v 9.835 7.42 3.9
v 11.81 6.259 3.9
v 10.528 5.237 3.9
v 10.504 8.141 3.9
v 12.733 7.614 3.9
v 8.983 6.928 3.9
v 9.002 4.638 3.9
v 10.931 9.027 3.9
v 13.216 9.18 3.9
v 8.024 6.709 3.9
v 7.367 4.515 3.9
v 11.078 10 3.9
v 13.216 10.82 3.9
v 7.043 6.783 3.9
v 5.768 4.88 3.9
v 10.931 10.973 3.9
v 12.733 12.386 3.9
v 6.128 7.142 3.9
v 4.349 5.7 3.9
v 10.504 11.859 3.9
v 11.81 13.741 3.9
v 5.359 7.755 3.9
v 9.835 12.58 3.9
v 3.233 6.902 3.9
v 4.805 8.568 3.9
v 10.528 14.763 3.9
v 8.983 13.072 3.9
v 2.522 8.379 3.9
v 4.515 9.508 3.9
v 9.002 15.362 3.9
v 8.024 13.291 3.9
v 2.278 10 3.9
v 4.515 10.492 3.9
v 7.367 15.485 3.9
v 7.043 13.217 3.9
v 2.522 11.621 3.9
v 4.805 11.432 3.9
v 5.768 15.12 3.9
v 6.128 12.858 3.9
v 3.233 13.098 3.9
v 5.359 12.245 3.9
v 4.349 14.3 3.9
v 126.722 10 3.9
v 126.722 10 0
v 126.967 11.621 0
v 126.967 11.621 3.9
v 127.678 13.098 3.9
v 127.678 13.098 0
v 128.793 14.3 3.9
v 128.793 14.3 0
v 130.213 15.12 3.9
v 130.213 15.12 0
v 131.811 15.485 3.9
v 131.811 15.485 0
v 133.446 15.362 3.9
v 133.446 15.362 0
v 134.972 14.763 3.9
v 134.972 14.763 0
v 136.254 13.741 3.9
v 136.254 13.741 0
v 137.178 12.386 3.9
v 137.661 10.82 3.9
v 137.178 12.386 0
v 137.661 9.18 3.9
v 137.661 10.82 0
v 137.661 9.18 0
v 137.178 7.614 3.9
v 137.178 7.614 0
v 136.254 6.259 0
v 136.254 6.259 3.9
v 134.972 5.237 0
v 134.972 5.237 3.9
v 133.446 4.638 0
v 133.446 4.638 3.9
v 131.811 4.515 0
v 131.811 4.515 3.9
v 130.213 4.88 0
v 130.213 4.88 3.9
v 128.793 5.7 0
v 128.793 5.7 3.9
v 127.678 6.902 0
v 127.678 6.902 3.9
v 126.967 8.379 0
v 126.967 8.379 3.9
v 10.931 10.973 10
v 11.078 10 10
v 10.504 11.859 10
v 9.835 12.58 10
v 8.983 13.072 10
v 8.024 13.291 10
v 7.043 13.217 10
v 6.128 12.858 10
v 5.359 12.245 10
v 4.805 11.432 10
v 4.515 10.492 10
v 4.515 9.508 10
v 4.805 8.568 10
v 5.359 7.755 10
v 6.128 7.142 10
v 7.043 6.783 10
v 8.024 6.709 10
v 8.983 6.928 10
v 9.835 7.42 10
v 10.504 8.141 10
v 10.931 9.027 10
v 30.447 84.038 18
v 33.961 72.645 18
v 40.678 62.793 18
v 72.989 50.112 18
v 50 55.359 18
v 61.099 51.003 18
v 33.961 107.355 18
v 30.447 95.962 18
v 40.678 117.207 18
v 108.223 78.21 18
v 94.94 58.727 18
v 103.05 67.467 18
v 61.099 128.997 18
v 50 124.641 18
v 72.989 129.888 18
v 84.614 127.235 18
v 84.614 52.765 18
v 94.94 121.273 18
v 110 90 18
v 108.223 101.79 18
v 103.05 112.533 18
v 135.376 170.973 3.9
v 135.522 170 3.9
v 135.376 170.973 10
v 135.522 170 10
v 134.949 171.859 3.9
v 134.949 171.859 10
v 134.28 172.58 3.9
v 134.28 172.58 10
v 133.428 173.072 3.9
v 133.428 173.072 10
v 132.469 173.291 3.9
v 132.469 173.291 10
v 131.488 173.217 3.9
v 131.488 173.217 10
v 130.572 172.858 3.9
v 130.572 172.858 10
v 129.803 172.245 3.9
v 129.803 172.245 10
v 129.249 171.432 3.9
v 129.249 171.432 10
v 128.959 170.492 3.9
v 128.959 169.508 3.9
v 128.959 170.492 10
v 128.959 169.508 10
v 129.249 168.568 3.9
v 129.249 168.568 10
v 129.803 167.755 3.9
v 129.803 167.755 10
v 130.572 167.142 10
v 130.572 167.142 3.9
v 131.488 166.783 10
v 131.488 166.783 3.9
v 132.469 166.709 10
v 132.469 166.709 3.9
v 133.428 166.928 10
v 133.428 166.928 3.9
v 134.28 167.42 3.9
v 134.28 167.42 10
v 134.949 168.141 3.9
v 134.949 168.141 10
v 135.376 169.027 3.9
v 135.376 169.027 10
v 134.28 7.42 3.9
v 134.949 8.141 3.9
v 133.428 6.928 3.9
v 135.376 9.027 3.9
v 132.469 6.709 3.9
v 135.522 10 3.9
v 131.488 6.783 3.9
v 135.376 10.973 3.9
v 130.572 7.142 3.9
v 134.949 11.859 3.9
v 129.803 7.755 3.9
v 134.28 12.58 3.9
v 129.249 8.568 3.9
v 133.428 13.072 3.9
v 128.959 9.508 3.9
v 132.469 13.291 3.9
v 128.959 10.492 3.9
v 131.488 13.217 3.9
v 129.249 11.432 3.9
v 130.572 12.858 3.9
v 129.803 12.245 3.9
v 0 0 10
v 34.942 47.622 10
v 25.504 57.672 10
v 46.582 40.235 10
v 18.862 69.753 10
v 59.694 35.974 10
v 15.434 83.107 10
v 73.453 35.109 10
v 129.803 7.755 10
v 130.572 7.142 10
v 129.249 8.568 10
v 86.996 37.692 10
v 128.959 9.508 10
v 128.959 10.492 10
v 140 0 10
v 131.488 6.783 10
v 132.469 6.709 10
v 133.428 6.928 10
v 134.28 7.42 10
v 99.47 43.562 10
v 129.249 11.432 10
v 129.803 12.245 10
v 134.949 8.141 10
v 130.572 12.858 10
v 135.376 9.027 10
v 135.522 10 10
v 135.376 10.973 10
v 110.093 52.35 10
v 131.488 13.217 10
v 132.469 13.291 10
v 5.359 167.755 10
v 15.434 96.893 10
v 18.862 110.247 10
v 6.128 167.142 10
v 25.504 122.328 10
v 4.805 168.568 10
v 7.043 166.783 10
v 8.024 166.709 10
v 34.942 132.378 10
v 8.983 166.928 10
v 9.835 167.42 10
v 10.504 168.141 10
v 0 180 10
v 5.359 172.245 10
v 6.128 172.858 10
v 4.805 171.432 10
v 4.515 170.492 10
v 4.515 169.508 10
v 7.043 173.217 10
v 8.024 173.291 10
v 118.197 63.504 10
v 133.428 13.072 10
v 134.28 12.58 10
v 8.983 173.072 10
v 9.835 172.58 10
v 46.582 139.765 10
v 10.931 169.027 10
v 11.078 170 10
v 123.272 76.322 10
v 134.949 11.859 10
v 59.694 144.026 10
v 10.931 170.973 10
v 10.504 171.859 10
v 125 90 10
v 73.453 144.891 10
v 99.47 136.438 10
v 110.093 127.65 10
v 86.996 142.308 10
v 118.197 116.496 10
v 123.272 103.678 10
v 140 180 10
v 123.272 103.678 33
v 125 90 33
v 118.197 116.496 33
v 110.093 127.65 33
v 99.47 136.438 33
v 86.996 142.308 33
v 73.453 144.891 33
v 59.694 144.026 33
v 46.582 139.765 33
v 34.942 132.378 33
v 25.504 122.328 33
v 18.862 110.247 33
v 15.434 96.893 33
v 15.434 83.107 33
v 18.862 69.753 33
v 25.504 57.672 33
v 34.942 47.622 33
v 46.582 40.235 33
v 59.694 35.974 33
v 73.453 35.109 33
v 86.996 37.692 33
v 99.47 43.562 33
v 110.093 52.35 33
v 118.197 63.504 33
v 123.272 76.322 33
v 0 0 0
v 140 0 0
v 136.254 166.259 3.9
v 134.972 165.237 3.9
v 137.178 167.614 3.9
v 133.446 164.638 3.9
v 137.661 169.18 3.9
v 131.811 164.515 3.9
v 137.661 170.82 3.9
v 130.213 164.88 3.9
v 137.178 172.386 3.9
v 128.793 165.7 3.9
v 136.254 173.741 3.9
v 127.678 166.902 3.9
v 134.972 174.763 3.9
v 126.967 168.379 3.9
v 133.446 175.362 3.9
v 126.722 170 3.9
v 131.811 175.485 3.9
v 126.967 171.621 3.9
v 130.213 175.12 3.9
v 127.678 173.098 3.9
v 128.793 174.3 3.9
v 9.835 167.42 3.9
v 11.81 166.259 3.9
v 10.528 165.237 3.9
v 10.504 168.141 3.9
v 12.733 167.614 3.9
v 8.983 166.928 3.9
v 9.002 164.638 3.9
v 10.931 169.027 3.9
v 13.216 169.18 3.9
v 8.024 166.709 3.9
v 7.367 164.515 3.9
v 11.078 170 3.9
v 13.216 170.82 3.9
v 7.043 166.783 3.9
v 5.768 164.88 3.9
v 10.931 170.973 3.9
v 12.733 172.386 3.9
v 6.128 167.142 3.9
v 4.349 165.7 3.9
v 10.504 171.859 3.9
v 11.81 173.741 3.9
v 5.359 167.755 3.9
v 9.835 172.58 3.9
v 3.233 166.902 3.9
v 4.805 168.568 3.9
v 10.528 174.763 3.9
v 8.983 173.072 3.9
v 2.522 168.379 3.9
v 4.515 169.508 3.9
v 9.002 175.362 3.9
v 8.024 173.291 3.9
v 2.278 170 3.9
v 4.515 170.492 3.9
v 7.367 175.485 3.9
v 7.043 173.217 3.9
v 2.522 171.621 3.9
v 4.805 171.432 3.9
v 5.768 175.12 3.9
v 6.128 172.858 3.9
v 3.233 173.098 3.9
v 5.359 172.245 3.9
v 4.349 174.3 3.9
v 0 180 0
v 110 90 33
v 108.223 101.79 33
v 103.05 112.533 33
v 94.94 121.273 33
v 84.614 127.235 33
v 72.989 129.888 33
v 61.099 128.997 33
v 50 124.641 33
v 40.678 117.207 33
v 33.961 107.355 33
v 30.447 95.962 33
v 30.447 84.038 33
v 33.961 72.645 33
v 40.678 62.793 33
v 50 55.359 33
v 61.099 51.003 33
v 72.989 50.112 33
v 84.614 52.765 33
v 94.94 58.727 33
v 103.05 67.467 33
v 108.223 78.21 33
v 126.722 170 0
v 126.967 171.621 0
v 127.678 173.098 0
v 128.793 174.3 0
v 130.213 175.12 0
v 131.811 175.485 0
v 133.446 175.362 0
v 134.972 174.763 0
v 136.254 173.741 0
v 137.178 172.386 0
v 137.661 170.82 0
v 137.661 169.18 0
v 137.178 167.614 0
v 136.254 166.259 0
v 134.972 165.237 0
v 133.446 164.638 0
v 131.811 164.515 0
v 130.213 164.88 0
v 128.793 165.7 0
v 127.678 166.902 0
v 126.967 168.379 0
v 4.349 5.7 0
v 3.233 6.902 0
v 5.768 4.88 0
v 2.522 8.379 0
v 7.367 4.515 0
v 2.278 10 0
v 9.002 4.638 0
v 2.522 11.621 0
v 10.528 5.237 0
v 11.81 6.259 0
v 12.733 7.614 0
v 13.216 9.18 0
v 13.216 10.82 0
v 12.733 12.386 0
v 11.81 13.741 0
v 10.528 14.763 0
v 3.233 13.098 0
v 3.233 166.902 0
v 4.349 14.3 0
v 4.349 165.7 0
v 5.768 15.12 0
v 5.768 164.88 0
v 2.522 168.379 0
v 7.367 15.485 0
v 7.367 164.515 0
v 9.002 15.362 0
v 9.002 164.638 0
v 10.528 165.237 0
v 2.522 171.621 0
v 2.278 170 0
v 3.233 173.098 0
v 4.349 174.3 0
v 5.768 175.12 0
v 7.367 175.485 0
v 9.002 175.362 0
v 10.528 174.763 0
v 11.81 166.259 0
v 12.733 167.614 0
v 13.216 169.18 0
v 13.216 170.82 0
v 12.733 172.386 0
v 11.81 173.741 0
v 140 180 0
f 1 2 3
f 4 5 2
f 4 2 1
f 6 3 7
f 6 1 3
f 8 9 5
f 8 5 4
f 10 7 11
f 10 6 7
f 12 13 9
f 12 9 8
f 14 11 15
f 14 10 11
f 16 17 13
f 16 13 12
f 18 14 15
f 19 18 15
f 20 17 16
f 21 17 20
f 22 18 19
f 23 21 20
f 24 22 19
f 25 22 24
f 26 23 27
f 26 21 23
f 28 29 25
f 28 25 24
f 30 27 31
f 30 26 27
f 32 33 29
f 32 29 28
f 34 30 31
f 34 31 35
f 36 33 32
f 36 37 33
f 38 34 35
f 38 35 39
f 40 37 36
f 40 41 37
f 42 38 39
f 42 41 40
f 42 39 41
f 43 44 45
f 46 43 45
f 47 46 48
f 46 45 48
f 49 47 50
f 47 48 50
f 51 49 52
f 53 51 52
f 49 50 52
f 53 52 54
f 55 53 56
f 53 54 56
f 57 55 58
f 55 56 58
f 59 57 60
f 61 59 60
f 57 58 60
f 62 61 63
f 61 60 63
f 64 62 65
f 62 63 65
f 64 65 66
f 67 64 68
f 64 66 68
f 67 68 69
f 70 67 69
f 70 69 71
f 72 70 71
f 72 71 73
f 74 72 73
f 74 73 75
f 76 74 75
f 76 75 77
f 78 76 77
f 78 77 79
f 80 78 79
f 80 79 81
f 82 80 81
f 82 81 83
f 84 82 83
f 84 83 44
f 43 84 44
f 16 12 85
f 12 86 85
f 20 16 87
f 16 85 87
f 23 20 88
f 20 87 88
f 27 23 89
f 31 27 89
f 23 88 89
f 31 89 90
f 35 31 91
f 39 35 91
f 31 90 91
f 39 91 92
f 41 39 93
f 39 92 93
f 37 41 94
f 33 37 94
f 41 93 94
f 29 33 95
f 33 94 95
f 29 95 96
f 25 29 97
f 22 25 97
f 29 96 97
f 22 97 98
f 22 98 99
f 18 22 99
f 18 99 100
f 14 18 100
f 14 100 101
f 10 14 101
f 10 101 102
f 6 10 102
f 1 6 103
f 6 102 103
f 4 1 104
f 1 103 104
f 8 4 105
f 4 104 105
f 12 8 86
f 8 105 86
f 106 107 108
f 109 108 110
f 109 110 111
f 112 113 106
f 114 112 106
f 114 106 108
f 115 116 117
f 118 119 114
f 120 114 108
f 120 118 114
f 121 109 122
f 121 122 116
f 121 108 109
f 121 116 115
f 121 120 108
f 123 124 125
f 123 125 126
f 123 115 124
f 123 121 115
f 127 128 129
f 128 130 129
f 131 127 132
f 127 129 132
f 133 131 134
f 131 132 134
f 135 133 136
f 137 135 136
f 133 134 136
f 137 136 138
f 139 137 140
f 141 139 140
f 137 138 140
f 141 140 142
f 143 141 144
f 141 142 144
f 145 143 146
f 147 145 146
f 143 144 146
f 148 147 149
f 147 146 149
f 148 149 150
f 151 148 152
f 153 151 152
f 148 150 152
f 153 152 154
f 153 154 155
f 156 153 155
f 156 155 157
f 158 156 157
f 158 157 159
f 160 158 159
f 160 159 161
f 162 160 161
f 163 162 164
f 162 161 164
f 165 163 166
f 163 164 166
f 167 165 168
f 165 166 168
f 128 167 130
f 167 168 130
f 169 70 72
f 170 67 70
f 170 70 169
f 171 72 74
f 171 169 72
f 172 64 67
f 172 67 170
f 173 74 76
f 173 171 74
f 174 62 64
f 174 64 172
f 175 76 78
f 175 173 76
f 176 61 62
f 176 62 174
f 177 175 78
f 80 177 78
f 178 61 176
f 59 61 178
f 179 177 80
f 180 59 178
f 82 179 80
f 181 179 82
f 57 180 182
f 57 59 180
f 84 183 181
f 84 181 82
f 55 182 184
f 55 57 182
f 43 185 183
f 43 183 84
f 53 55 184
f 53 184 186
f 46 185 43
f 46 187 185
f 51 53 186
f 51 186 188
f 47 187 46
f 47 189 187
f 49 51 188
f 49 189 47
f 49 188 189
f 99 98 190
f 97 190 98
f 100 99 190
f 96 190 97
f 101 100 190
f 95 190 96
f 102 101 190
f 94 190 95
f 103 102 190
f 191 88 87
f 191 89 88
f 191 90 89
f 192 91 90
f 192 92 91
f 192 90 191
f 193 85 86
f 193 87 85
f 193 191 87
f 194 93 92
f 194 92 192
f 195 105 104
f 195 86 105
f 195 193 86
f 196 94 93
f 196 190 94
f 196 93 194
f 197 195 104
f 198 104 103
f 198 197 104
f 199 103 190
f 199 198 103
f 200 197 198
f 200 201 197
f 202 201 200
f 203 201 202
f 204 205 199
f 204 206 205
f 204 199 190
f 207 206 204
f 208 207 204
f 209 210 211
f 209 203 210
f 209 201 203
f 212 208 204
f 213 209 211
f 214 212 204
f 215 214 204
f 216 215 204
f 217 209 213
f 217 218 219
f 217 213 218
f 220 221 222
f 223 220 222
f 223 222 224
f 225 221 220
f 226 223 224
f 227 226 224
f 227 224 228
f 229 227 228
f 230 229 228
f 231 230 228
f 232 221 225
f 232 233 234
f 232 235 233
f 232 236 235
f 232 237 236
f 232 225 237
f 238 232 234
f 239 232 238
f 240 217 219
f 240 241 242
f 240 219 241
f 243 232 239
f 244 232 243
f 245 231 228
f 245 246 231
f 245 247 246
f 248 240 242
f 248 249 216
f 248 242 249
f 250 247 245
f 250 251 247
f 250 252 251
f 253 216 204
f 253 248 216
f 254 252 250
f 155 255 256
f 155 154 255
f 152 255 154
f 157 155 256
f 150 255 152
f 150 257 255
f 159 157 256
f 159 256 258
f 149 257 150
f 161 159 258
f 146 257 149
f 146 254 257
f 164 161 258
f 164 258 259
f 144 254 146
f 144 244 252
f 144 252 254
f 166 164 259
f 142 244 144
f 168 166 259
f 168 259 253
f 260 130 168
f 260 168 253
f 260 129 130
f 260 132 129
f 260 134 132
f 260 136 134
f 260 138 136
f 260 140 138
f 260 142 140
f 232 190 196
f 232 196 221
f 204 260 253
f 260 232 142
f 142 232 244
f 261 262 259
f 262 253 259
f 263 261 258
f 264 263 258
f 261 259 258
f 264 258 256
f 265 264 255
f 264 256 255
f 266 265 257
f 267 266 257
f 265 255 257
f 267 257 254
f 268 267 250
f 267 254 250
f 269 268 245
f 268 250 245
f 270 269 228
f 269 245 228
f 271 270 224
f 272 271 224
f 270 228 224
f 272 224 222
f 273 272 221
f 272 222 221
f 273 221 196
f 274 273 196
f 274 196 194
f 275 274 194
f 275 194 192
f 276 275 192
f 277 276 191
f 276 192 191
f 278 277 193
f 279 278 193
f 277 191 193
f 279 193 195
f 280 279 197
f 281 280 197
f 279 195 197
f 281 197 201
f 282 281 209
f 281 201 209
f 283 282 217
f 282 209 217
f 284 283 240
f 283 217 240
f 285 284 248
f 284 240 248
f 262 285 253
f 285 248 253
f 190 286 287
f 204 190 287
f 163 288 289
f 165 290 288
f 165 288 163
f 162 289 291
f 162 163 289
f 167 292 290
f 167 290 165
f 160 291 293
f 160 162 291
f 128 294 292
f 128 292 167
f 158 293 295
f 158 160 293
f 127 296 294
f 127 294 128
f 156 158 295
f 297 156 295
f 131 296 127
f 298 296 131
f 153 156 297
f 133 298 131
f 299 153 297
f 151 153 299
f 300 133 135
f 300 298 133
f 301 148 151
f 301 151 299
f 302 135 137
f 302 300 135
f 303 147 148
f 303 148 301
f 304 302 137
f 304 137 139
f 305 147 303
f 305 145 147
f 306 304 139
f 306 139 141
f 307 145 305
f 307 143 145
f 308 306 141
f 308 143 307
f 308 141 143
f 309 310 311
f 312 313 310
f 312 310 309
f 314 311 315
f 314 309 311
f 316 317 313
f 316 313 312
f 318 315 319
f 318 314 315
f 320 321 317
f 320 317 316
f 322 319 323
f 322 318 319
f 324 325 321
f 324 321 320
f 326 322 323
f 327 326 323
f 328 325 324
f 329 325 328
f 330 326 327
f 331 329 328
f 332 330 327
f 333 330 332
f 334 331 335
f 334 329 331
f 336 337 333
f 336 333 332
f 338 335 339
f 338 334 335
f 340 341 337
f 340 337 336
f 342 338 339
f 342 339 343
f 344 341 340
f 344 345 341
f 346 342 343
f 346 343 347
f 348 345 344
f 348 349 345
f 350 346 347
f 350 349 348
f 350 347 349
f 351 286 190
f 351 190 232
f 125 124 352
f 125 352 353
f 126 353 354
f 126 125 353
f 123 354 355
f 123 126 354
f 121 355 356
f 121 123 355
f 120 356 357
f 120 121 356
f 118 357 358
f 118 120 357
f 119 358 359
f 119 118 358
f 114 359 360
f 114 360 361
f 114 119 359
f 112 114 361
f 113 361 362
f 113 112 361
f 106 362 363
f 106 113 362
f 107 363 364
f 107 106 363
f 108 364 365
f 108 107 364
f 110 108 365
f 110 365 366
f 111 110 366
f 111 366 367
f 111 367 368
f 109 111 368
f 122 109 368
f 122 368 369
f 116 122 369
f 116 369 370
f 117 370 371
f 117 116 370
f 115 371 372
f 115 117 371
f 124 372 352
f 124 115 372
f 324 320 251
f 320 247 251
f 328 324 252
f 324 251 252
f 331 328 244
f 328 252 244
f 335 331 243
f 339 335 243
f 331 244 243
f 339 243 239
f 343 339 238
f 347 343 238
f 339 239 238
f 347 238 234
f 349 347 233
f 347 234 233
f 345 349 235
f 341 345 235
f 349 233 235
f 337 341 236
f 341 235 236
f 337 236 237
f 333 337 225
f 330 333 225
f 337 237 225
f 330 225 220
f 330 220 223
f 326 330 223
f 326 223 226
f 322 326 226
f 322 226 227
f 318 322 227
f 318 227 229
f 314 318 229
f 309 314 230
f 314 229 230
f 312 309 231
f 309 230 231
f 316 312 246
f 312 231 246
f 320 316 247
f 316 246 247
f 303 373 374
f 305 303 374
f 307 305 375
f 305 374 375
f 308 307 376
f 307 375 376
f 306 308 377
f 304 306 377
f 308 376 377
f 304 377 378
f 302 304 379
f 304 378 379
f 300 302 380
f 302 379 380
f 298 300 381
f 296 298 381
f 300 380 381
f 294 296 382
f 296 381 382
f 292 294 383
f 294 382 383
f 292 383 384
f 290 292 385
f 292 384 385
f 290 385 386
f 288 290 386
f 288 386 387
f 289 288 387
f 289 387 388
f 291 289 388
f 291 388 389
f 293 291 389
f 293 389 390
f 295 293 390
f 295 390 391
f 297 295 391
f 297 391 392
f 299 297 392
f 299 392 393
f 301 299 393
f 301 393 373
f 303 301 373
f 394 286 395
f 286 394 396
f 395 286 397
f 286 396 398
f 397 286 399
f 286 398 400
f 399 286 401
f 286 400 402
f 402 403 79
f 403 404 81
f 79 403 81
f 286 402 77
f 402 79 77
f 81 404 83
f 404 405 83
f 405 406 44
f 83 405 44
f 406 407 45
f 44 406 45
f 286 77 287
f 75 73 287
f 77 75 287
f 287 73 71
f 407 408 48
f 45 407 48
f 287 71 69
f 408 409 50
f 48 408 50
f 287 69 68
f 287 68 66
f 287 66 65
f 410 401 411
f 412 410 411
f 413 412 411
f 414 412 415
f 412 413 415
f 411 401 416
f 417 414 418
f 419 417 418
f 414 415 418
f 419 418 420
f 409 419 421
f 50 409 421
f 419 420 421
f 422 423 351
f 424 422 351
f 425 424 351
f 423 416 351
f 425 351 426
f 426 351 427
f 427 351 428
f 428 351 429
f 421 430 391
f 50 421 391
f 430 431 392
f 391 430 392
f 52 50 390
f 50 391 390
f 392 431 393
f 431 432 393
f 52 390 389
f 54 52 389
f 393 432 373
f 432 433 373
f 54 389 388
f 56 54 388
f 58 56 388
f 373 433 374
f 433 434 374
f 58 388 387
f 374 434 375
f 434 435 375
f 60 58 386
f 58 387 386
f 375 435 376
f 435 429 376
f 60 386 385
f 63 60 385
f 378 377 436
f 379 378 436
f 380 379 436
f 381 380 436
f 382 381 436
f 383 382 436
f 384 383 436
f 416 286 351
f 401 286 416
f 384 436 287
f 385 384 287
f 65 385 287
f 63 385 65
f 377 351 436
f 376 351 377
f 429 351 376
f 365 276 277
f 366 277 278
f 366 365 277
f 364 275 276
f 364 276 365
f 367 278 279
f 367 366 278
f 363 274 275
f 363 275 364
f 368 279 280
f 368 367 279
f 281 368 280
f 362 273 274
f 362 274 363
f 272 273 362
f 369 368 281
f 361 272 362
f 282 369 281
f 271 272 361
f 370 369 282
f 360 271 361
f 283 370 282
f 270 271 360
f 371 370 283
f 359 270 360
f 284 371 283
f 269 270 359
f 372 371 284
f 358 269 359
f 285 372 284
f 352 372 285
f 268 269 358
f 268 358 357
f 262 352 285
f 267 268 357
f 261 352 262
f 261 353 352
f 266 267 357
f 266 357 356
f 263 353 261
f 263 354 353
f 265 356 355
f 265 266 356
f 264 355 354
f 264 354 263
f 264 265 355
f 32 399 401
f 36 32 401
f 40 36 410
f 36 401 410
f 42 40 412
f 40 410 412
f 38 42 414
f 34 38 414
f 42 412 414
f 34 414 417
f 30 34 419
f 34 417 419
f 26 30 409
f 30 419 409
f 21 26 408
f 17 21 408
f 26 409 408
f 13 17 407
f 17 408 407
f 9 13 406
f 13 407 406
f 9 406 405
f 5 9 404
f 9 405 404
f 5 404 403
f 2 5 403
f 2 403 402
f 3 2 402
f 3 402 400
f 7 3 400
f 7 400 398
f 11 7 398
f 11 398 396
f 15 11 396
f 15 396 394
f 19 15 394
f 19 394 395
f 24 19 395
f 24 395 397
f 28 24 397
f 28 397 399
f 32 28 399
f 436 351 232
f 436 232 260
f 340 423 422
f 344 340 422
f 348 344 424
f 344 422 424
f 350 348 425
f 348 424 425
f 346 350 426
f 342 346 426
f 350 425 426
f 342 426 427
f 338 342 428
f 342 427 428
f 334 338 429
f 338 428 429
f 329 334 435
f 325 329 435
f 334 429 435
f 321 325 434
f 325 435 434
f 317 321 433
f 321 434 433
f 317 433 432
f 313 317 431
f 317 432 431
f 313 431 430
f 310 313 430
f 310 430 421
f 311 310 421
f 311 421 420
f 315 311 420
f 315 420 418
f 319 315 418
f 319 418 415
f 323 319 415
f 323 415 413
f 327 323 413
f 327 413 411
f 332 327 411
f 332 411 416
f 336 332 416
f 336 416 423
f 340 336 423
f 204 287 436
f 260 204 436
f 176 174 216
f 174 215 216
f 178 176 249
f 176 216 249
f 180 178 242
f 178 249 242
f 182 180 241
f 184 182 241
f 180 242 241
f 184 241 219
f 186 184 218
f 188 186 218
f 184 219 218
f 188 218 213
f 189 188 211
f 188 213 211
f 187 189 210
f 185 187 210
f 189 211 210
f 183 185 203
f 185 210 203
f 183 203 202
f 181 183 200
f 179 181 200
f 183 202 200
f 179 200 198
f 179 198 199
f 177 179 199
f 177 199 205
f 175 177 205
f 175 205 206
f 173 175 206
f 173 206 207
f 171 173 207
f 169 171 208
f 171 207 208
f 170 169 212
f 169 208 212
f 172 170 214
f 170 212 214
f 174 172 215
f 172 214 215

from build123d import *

# Parameters (mm, degrees)
CROQUIS1_W                                           = 140
CROQUIS1_H                                           = 180
SALIENTE_EXTRUIR1_DEPTH                              = 10
CROQUIS2_R                                           = 55
SALIENTE_EXTRUIR2_DEPTH                              = 8
CROQUIS3_R                                           = 55
CROQUIS3_R_2                                         = 40
SALIENTE_EXTRUIR3_DEPTH                              = 15
REFRENTADO_PARA_TORNILLO_CON_CABEZA_PLAN_D           = 6.6
REFRENTADO_PARA_TORNILLO_CON_CABEZA_PLAN_CBORE_D     = 11
REFRENTADO_PARA_TORNILLO_CON_CABEZA_PLAN_CBORE_DEPTH = 3.9


with BuildPart() as part:
    # Croquis1 → Saliente-Extruir1 (new body)
    with BuildSketch(Plane.XY):
        with Locations((70, 90)):
            Rectangle(CROQUIS1_W, CROQUIS1_H)
    extrude(amount=SALIENTE_EXTRUIR1_DEPTH)

    # Croquis2 → Saliente-Extruir2 (add)
    with BuildSketch(Plane.XY.offset(10)):
        with Locations((70, 90)):
            Circle(CROQUIS2_R)
    extrude(amount=SALIENTE_EXTRUIR2_DEPTH)

    # Croquis3 → Saliente-Extruir3 (add)
    with BuildSketch(Plane.XY.offset(18)):
        with Locations((70, 90)):
            Circle(CROQUIS3_R)
        with Locations((70, 90)):
            Circle(CROQUIS3_R_2, mode=Mode.SUBTRACT)
    extrude(amount=SALIENTE_EXTRUIR3_DEPTH)

    # Refrentado para tornillo con cabeza plana de M61 (through all)
    with Locations(Plane(origin=(0, 0, 0), x_dir=(-1, 0, 0), z_dir=(0, 0, -1))):
        with Locations((-132.222222222, 170), (-7.777777778, 170), (-7.777777778, 10), (-132.222222222, 10)):
            CounterBoreHole(REFRENTADO_PARA_TORNILLO_CON_CABEZA_PLAN_D / 2, REFRENTADO_PARA_TORNILLO_CON_CABEZA_PLAN_CBORE_D / 2, REFRENTADO_PARA_TORNILLO_CON_CABEZA_PLAN_CBORE_DEPTH)


solid = part.part
